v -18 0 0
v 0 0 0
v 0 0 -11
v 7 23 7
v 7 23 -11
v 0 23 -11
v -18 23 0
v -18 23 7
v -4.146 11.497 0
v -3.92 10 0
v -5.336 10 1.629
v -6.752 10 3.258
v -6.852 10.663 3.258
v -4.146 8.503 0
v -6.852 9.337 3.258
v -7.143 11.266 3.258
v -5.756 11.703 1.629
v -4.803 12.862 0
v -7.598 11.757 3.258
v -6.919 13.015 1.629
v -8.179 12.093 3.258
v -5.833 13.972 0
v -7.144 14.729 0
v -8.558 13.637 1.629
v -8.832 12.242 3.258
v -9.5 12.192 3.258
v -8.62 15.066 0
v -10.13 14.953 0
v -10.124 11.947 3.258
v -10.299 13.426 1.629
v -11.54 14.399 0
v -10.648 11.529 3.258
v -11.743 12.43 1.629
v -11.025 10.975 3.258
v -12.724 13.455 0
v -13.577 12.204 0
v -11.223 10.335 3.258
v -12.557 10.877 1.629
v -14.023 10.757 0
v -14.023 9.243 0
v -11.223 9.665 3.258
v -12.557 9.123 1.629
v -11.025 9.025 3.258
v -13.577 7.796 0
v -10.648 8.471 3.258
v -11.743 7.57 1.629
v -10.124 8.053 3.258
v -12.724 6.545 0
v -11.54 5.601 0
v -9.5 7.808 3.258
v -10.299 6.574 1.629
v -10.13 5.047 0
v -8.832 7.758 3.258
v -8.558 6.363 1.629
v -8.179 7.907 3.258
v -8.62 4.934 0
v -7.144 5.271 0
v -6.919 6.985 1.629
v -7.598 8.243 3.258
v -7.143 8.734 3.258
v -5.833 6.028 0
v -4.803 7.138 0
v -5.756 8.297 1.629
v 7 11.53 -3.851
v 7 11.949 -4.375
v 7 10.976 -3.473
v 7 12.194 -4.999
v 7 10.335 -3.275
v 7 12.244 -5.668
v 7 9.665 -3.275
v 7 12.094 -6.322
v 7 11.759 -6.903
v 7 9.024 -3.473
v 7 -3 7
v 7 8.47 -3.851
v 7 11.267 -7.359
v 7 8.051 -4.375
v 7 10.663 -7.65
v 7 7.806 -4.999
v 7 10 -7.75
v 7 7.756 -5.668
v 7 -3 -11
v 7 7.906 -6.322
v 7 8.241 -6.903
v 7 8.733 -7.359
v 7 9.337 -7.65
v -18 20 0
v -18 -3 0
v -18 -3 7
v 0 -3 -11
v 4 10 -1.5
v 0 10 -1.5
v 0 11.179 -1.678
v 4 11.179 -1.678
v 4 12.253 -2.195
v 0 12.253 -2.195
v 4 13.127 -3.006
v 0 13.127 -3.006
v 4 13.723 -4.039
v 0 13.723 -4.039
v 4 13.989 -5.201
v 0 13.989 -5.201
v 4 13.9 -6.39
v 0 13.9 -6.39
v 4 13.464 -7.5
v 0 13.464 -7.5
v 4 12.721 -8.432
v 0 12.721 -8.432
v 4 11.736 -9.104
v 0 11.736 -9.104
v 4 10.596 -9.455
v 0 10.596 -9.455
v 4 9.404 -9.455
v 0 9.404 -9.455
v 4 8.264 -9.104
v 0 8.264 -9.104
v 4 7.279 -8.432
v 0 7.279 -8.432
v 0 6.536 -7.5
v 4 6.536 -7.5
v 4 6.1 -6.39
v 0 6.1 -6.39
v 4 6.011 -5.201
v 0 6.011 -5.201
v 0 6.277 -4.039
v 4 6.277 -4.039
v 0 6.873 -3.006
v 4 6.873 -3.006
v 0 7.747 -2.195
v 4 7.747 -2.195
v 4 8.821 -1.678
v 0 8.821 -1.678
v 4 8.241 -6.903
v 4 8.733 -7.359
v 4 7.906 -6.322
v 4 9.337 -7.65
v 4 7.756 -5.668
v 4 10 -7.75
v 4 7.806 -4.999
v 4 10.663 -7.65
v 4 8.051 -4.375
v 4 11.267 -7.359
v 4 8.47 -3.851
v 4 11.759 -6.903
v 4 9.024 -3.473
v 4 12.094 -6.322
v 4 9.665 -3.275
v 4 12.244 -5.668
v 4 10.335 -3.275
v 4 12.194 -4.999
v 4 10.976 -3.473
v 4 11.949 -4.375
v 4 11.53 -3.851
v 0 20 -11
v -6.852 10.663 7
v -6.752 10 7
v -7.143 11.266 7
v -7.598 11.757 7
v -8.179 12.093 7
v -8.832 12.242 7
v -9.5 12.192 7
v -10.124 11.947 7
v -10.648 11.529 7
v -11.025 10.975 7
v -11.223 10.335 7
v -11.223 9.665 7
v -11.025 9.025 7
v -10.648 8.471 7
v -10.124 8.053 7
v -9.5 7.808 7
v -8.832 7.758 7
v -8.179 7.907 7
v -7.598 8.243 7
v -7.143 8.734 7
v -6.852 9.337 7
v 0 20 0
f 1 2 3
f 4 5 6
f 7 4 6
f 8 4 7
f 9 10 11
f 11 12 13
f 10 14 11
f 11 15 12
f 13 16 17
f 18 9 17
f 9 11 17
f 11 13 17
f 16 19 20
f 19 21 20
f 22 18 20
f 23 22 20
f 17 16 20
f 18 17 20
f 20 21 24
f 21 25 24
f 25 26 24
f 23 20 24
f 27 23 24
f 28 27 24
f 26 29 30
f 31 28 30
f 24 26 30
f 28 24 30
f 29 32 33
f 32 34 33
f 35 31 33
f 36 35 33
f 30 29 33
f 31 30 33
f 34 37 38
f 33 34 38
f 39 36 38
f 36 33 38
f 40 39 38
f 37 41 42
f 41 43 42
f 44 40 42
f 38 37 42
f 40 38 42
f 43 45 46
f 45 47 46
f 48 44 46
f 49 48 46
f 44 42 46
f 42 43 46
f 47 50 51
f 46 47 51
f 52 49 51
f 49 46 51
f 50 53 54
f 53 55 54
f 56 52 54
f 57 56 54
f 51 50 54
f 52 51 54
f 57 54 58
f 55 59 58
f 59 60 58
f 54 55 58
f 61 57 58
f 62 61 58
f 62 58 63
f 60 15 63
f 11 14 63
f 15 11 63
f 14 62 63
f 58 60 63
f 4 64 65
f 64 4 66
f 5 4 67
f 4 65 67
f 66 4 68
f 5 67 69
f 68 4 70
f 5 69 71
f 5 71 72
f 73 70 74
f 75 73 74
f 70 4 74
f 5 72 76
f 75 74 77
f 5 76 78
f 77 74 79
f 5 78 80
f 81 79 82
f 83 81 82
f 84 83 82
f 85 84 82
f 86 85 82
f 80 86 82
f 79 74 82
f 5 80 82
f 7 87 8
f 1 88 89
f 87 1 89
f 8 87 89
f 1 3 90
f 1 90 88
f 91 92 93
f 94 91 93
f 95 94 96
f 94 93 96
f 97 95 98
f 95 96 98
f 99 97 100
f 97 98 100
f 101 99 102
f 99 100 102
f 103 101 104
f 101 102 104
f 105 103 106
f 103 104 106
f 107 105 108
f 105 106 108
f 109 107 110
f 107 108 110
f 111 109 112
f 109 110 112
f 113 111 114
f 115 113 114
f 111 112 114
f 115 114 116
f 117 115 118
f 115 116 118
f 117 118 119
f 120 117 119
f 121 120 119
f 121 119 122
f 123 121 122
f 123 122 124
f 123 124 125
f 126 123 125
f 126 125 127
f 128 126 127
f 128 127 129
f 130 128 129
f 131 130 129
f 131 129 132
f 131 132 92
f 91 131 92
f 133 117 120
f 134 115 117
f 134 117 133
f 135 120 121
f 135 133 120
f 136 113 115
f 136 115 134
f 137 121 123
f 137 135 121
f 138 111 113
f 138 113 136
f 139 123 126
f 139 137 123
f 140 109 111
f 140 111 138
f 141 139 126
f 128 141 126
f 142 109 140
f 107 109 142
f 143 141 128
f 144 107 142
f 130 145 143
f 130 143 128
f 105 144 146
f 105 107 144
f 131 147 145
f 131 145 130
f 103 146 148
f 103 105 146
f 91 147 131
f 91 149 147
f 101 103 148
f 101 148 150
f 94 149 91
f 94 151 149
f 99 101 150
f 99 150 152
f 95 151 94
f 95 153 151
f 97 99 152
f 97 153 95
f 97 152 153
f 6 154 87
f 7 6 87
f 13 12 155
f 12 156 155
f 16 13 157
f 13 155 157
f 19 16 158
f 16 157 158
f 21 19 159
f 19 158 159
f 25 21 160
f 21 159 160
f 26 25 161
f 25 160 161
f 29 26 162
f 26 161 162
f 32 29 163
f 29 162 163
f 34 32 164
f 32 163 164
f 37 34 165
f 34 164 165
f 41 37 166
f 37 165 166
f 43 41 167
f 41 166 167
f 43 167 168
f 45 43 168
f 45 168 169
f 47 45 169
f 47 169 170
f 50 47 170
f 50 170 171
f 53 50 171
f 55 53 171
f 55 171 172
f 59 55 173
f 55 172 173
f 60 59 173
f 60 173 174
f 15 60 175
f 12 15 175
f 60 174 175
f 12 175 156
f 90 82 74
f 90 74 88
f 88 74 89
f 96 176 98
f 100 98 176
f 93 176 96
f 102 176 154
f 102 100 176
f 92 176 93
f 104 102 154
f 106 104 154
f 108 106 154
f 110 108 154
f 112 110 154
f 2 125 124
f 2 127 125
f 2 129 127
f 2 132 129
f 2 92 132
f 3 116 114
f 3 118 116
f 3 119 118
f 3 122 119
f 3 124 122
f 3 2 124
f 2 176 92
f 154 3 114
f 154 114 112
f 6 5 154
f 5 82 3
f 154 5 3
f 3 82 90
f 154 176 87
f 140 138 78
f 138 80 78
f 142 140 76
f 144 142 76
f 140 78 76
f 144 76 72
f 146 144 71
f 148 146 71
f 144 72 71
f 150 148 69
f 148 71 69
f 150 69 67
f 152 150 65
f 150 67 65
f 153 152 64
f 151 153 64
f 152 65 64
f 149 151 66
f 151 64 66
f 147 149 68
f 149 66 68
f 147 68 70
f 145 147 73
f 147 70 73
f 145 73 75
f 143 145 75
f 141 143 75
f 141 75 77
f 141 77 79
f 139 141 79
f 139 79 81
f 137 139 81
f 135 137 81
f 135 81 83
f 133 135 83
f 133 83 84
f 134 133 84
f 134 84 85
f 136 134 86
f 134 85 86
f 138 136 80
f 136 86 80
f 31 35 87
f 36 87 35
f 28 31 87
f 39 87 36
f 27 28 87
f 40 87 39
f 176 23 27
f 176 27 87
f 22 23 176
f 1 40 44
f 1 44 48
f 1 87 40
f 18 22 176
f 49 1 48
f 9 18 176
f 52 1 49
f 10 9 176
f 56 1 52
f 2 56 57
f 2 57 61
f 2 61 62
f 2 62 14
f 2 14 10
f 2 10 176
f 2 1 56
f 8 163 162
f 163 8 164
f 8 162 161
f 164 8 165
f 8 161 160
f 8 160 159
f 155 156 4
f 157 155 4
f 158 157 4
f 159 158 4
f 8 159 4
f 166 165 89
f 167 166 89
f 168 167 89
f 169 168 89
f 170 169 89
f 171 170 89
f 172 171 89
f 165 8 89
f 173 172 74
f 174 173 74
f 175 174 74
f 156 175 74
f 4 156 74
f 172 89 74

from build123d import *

# Parameters (mm, degrees)
BOSS_EXTRUDE1_DEPTH                               = 20
CBORE_FOR_M4_SHCS1_D                              = 4.5
CBORE_FOR_M4_SHCS1_CBORE_D                        = 8
CBORE_FOR_M4_SHCS1_CBORE_DEPTH                    = 4
CSK_FOR_8_FLAT_HEAD_SOCKET_CAP_SCREW1_D           = 4.4958
CSK_FOR_8_FLAT_HEAD_SOCKET_CAP_SCREW1_CSINK_D     = 10.16
CSK_FOR_8_FLAT_HEAD_SOCKET_CAP_SCREW1_CSINK_ANGLE = 82
BOSS_EXTRUDE2_DEPTH                               = 3
BOSS_EXTRUDE3_START                               = -20
BOSS_EXTRUDE3_DEPTH                               = 3


with BuildPart() as part:
    # Sketch1 → Boss-Extrude1 (new body)
    with BuildSketch(Plane(origin=(0, 0, 0), x_dir=(1, 0, 0), z_dir=(0, 1, 0))):
        Polygon((0, 0), (0, 11), (7, 11), (7, -7), (-18, -7), (-18, 0), align=None)
    extrude(amount=BOSS_EXTRUDE1_DEPTH)

    # CBORE for M4 SHCS1 (through all)
    with Locations(Plane.ZY):
        with Locations((-5.5, 10)):
            CounterBoreHole(CBORE_FOR_M4_SHCS1_D / 2, CBORE_FOR_M4_SHCS1_CBORE_D / 2, CBORE_FOR_M4_SHCS1_CBORE_DEPTH)

    # CSK for #8 Flat Head Socket Cap Screw1 (through all)
    with Locations(Plane(origin=(0, 0, 0), x_dir=(-1, 0, 0), z_dir=(0, 0, -1))):
        with Locations((9, 10)):
            CounterSinkHole(CSK_FOR_8_FLAT_HEAD_SOCKET_CAP_SCREW1_D / 2, CSK_FOR_8_FLAT_HEAD_SOCKET_CAP_SCREW1_CSINK_D / 2, counter_sink_angle=CSK_FOR_8_FLAT_HEAD_SOCKET_CAP_SCREW1_CSINK_ANGLE)

    # Sketch6 → Boss-Extrude2 (add)
    with BuildSketch(Plane.XZ):
        Polygon((-18, 7), (7, 7), (7, -11), (0, -11), (-18, 0), align=None)
    extrude(amount=BOSS_EXTRUDE2_DEPTH)

    # Sketch6<2> → Boss-Extrude3 (add)
    with BuildSketch(Plane.XZ.offset(BOSS_EXTRUDE3_START)):
        Polygon((-18, 7), (7, 7), (7, -11), (0, -11), (-18, 0), align=None)
    extrude(amount=-BOSS_EXTRUDE3_DEPTH)


solid = part.part
